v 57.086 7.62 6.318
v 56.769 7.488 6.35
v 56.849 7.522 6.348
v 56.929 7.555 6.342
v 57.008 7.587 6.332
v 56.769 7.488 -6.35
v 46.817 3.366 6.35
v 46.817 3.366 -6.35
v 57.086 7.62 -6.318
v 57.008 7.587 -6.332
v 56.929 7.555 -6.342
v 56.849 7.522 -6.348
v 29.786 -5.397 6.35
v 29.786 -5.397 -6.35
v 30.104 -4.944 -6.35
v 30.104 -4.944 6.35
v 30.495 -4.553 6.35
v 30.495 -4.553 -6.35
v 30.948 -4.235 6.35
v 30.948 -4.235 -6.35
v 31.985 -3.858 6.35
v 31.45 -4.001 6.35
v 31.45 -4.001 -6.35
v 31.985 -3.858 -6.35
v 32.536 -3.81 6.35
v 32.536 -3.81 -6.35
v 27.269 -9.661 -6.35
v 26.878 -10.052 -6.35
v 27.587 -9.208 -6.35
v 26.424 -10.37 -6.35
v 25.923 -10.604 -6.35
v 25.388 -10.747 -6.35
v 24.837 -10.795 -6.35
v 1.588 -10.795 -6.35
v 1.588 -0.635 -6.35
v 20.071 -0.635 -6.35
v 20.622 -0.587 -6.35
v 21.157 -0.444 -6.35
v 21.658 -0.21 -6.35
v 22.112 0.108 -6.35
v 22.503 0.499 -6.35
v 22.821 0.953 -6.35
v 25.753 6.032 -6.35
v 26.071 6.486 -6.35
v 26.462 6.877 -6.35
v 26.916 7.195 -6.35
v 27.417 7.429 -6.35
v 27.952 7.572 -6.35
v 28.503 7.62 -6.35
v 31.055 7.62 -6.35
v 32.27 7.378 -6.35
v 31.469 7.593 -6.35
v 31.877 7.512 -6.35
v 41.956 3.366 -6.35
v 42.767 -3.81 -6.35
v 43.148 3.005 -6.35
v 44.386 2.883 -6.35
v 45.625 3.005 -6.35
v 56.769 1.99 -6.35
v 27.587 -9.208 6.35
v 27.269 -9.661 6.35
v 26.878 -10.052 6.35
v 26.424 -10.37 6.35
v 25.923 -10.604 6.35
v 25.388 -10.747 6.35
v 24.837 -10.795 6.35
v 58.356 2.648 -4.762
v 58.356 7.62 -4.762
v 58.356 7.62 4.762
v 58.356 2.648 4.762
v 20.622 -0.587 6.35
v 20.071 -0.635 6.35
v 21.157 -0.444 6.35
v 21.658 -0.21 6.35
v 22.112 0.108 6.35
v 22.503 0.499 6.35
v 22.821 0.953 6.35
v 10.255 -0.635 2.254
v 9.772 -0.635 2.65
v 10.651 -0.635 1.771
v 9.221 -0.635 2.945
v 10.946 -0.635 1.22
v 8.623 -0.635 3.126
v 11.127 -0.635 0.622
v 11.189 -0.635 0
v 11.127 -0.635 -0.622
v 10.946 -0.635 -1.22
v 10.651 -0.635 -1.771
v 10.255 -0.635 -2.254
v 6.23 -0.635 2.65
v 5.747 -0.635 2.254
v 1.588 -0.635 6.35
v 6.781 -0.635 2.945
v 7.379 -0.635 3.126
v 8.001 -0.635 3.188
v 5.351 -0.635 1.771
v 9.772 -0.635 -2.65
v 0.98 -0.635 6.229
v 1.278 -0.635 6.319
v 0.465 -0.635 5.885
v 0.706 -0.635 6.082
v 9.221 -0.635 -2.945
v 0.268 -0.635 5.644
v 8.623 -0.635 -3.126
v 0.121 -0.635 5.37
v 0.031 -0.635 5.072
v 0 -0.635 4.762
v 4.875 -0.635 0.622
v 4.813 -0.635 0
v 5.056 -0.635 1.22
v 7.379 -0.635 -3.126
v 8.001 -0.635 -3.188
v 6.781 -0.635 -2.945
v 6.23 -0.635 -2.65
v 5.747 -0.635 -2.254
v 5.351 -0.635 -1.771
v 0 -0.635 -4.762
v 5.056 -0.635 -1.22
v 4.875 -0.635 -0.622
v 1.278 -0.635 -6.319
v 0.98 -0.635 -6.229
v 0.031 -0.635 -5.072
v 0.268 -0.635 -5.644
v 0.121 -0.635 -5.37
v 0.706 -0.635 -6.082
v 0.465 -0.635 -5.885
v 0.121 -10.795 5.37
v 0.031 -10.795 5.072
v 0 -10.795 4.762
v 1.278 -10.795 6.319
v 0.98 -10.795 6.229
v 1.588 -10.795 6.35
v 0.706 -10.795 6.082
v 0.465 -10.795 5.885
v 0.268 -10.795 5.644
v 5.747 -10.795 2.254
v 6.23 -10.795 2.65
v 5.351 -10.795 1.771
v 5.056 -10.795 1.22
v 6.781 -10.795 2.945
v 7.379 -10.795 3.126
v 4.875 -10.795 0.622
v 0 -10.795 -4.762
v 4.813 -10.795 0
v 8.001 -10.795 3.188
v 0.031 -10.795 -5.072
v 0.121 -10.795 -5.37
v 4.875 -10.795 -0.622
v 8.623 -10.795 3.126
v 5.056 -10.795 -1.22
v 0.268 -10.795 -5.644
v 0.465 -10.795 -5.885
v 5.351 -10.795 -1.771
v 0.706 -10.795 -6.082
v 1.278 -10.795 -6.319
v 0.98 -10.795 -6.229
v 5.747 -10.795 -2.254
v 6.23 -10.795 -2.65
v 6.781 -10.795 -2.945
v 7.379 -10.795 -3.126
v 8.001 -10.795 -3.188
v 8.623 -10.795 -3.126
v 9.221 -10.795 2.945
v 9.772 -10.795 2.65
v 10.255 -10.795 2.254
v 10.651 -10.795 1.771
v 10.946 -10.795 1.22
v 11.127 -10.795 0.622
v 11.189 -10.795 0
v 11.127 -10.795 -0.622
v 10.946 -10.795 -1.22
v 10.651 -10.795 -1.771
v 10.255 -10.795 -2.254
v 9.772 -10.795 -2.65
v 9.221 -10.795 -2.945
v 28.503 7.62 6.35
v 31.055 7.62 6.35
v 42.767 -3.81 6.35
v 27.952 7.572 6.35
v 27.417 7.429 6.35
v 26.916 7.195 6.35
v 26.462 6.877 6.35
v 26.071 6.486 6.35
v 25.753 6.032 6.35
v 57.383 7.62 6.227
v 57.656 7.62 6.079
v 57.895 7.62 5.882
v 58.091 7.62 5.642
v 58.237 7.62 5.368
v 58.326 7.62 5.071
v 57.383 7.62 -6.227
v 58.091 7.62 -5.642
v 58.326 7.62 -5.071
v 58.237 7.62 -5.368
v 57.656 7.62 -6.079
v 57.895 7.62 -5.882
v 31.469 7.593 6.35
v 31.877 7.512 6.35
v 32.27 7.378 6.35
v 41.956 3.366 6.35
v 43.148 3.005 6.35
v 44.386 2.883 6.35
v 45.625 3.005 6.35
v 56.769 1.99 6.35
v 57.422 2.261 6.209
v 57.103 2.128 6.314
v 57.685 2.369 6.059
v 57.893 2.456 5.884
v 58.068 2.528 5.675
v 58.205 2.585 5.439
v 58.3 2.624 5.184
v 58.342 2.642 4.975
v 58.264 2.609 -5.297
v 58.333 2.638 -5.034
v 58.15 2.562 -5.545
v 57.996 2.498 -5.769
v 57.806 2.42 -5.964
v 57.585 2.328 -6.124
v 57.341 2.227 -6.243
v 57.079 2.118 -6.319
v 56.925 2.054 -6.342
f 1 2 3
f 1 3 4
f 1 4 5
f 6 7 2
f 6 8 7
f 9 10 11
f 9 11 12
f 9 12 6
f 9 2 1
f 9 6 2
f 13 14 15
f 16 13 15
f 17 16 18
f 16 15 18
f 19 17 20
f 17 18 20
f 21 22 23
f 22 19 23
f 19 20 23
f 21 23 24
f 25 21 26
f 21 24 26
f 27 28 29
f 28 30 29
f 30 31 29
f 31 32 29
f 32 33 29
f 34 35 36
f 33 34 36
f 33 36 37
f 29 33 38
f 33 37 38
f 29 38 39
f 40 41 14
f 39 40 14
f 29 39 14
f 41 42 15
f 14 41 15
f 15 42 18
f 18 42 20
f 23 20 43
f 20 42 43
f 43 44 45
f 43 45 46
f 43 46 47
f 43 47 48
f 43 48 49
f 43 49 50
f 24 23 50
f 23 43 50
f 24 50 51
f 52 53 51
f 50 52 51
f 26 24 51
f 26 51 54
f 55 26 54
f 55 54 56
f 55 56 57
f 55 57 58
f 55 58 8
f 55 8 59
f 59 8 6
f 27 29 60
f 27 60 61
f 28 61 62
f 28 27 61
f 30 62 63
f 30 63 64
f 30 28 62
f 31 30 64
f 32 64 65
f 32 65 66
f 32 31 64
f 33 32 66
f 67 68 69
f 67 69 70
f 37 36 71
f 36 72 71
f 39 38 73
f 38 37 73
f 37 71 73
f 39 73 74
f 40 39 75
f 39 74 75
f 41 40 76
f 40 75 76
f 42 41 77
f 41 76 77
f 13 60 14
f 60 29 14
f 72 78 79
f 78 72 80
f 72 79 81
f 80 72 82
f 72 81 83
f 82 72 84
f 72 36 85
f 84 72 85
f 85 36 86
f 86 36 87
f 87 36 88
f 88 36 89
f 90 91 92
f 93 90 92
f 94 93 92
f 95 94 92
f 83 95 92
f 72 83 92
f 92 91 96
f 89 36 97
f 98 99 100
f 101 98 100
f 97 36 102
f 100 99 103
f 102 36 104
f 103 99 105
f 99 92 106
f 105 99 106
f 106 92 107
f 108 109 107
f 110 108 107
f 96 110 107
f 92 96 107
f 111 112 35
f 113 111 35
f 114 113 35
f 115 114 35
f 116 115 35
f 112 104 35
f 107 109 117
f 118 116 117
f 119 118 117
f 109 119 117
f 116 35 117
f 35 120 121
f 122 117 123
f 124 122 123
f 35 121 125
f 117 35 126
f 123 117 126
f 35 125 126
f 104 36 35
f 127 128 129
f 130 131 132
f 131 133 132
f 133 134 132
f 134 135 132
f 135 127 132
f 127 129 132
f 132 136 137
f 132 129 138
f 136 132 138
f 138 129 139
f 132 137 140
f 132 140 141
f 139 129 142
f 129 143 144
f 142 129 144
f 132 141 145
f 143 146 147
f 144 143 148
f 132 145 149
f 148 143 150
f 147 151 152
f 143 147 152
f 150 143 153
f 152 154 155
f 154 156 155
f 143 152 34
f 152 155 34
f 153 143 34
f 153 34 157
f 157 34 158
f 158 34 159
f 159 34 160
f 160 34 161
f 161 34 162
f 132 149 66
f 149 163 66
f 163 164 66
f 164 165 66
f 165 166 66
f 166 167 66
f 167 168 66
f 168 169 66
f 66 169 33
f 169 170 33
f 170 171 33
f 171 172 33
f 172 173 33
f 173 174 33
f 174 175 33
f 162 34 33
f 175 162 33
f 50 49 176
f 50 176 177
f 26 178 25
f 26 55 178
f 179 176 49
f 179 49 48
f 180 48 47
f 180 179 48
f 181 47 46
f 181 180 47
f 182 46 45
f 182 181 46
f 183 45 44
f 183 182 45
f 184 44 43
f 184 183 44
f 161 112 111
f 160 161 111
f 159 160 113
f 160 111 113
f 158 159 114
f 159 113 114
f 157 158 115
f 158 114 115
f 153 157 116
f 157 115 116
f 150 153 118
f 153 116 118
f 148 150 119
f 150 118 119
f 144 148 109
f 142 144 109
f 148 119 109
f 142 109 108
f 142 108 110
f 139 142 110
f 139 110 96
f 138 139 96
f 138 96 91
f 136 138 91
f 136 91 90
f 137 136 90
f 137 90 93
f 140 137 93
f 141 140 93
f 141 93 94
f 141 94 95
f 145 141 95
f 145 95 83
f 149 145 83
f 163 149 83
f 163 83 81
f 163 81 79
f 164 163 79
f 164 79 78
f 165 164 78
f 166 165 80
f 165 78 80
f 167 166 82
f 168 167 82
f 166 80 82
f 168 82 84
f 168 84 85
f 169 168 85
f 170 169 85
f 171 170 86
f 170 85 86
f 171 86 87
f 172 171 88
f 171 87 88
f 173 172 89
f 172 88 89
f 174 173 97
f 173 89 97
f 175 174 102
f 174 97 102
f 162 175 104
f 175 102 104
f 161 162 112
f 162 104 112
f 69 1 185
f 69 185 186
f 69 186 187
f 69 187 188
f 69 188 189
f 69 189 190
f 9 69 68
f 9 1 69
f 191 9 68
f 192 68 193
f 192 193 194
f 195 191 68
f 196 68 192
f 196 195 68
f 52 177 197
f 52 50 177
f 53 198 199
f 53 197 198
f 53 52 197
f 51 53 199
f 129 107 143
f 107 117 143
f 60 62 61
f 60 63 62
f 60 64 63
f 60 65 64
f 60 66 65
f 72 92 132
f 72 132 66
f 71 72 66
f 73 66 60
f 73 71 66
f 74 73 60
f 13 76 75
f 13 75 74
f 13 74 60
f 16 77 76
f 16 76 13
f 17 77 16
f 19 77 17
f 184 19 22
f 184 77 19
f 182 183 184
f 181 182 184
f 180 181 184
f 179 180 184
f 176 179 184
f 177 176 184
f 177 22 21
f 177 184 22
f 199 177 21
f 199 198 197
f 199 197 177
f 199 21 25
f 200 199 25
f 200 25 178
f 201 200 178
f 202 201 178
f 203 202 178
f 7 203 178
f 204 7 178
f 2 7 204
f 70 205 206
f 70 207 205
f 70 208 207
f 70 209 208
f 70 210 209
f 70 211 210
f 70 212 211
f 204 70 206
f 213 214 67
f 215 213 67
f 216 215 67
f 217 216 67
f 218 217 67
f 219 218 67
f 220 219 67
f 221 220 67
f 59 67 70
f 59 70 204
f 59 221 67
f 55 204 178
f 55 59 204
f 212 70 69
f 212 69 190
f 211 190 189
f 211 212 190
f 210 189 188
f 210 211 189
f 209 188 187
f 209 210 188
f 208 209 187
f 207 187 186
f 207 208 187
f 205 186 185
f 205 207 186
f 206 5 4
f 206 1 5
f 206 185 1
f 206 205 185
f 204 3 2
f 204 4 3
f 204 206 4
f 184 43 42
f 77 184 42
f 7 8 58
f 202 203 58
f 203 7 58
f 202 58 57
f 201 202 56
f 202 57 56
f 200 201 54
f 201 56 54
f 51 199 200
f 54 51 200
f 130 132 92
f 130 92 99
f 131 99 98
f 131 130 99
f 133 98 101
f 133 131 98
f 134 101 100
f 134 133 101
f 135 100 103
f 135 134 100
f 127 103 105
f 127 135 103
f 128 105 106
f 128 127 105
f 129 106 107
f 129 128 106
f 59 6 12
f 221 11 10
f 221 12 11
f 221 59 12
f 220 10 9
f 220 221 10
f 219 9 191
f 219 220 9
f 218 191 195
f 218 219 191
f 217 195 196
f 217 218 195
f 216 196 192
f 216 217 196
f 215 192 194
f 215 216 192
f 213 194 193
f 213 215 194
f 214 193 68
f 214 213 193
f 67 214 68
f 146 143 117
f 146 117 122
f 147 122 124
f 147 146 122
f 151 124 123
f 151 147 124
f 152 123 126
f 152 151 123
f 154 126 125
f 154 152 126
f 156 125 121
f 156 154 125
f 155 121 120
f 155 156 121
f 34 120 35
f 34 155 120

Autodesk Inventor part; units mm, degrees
ref_plane "YZ Plane" through (0, 0, 0) normal (1, 0, 0) x (0, 1, 0)
ref_plane "XZ Plane" through (0, 0, 0) normal (0, 1, 0) x (-1, 0, 0)
ref_plane "XY Plane" through (0, 0, 0) normal (0, 0, 1) x (1, 0, 0)
sketch "Sketch1" plane through (0, 0, 0) normal (0, 0, 1) x (1, 0, 0)
  line L0 (26.67, 7.62) -> (31.6865, 7.62)
  line L1 (31.6865, 7.62) -> (44.3865, 2.3595)
  line L2 (44.3865, 2.3595) -> (57.0865, 7.62)
  line L3 (42.7667, -3.81) -> (30.7028, -3.81)
  line L4 (57.0865, 7.62) -> (58.3565, 7.62)
  line L5 (58.3565, 7.62) -> (58.3565, 2.6475)
  line L6 (21.904, -0.635) -> (0, -0.635)
  line L7 (0, -0.635) -> (0, -10.795)
  line L8 (0, -10.795) -> (26.67, -10.795)
  line L9 (58.3565, 2.6475) -> (42.7667, -3.81)
  line L10 (26.67, 7.62) -> (21.904, -0.635)
  line L11 (26.67, -10.795) -> (30.7028, -3.81)
  point P0 (0, 0)
  dimension "d1" = 12.7
  dimension "d2" = 12.7
  dimension "d3" = 135
  dimension "d4" = 1.27
  dimension "d21" = 6.1695
  dimension "d22" = 11.43
  dimension "d45" = 5.08
  dimension "d48" = 7.62
  dimension "d49" = 0.635
  dimension "d50" = 10.16
  dimension "d56" = 26.67
  dimension "d57" = 120
  dimension "d58" = 120
extrude "Extrusion1" add sketch "Sketch1" along normal mid plane 12.7
sketch "Sketch3" plane through (0, -10.795, 6.35) normal (0, -1, 0) x (1, 0, 0)
  line L0 (44.3865, -12.7) -> (44.3865, 0) projected
  line L1 (26.67, 0) -> (0, 0) projected
  point P0 (0, -6.35)
  point P1 (8.001, -6.35)
  point P2 (0, -12.7)
  dimension "d26" = 36.3855
  dimension "d52" = 12.7
  dimension "d53" = 6.35
hole "Hole2" at (8.001, -10.795, 0) direction (0, 1, 0) diameter 6.3754 end through all
fillet "Fillet3" radius 6.35 1 edges at (44.3865, 2.3595, 0)
chamfer "Chamfer2" [suppressed]
fillet "Fillet5" [suppressed]
fillet "Fillet1" radius 1.5875 4 edges at (58.3565, 5.1337, 6.35) (58.3565, 5.1337, -6.35) (0, -5.715, -6.35) (0, -5.715, 6.35)
fillet "Fillet6" radius 3.175 5 edges at (21.904, -0.635, 0) (26.67, 7.62, 0) (31.6865, 7.62, 0) (26.67, -10.795, 0) (30.7028, -3.81, 0)
equation "\"d53\" = 0.5 * d52"
properties part number "J002865" material "ALUMINUM, 6061-T651"
